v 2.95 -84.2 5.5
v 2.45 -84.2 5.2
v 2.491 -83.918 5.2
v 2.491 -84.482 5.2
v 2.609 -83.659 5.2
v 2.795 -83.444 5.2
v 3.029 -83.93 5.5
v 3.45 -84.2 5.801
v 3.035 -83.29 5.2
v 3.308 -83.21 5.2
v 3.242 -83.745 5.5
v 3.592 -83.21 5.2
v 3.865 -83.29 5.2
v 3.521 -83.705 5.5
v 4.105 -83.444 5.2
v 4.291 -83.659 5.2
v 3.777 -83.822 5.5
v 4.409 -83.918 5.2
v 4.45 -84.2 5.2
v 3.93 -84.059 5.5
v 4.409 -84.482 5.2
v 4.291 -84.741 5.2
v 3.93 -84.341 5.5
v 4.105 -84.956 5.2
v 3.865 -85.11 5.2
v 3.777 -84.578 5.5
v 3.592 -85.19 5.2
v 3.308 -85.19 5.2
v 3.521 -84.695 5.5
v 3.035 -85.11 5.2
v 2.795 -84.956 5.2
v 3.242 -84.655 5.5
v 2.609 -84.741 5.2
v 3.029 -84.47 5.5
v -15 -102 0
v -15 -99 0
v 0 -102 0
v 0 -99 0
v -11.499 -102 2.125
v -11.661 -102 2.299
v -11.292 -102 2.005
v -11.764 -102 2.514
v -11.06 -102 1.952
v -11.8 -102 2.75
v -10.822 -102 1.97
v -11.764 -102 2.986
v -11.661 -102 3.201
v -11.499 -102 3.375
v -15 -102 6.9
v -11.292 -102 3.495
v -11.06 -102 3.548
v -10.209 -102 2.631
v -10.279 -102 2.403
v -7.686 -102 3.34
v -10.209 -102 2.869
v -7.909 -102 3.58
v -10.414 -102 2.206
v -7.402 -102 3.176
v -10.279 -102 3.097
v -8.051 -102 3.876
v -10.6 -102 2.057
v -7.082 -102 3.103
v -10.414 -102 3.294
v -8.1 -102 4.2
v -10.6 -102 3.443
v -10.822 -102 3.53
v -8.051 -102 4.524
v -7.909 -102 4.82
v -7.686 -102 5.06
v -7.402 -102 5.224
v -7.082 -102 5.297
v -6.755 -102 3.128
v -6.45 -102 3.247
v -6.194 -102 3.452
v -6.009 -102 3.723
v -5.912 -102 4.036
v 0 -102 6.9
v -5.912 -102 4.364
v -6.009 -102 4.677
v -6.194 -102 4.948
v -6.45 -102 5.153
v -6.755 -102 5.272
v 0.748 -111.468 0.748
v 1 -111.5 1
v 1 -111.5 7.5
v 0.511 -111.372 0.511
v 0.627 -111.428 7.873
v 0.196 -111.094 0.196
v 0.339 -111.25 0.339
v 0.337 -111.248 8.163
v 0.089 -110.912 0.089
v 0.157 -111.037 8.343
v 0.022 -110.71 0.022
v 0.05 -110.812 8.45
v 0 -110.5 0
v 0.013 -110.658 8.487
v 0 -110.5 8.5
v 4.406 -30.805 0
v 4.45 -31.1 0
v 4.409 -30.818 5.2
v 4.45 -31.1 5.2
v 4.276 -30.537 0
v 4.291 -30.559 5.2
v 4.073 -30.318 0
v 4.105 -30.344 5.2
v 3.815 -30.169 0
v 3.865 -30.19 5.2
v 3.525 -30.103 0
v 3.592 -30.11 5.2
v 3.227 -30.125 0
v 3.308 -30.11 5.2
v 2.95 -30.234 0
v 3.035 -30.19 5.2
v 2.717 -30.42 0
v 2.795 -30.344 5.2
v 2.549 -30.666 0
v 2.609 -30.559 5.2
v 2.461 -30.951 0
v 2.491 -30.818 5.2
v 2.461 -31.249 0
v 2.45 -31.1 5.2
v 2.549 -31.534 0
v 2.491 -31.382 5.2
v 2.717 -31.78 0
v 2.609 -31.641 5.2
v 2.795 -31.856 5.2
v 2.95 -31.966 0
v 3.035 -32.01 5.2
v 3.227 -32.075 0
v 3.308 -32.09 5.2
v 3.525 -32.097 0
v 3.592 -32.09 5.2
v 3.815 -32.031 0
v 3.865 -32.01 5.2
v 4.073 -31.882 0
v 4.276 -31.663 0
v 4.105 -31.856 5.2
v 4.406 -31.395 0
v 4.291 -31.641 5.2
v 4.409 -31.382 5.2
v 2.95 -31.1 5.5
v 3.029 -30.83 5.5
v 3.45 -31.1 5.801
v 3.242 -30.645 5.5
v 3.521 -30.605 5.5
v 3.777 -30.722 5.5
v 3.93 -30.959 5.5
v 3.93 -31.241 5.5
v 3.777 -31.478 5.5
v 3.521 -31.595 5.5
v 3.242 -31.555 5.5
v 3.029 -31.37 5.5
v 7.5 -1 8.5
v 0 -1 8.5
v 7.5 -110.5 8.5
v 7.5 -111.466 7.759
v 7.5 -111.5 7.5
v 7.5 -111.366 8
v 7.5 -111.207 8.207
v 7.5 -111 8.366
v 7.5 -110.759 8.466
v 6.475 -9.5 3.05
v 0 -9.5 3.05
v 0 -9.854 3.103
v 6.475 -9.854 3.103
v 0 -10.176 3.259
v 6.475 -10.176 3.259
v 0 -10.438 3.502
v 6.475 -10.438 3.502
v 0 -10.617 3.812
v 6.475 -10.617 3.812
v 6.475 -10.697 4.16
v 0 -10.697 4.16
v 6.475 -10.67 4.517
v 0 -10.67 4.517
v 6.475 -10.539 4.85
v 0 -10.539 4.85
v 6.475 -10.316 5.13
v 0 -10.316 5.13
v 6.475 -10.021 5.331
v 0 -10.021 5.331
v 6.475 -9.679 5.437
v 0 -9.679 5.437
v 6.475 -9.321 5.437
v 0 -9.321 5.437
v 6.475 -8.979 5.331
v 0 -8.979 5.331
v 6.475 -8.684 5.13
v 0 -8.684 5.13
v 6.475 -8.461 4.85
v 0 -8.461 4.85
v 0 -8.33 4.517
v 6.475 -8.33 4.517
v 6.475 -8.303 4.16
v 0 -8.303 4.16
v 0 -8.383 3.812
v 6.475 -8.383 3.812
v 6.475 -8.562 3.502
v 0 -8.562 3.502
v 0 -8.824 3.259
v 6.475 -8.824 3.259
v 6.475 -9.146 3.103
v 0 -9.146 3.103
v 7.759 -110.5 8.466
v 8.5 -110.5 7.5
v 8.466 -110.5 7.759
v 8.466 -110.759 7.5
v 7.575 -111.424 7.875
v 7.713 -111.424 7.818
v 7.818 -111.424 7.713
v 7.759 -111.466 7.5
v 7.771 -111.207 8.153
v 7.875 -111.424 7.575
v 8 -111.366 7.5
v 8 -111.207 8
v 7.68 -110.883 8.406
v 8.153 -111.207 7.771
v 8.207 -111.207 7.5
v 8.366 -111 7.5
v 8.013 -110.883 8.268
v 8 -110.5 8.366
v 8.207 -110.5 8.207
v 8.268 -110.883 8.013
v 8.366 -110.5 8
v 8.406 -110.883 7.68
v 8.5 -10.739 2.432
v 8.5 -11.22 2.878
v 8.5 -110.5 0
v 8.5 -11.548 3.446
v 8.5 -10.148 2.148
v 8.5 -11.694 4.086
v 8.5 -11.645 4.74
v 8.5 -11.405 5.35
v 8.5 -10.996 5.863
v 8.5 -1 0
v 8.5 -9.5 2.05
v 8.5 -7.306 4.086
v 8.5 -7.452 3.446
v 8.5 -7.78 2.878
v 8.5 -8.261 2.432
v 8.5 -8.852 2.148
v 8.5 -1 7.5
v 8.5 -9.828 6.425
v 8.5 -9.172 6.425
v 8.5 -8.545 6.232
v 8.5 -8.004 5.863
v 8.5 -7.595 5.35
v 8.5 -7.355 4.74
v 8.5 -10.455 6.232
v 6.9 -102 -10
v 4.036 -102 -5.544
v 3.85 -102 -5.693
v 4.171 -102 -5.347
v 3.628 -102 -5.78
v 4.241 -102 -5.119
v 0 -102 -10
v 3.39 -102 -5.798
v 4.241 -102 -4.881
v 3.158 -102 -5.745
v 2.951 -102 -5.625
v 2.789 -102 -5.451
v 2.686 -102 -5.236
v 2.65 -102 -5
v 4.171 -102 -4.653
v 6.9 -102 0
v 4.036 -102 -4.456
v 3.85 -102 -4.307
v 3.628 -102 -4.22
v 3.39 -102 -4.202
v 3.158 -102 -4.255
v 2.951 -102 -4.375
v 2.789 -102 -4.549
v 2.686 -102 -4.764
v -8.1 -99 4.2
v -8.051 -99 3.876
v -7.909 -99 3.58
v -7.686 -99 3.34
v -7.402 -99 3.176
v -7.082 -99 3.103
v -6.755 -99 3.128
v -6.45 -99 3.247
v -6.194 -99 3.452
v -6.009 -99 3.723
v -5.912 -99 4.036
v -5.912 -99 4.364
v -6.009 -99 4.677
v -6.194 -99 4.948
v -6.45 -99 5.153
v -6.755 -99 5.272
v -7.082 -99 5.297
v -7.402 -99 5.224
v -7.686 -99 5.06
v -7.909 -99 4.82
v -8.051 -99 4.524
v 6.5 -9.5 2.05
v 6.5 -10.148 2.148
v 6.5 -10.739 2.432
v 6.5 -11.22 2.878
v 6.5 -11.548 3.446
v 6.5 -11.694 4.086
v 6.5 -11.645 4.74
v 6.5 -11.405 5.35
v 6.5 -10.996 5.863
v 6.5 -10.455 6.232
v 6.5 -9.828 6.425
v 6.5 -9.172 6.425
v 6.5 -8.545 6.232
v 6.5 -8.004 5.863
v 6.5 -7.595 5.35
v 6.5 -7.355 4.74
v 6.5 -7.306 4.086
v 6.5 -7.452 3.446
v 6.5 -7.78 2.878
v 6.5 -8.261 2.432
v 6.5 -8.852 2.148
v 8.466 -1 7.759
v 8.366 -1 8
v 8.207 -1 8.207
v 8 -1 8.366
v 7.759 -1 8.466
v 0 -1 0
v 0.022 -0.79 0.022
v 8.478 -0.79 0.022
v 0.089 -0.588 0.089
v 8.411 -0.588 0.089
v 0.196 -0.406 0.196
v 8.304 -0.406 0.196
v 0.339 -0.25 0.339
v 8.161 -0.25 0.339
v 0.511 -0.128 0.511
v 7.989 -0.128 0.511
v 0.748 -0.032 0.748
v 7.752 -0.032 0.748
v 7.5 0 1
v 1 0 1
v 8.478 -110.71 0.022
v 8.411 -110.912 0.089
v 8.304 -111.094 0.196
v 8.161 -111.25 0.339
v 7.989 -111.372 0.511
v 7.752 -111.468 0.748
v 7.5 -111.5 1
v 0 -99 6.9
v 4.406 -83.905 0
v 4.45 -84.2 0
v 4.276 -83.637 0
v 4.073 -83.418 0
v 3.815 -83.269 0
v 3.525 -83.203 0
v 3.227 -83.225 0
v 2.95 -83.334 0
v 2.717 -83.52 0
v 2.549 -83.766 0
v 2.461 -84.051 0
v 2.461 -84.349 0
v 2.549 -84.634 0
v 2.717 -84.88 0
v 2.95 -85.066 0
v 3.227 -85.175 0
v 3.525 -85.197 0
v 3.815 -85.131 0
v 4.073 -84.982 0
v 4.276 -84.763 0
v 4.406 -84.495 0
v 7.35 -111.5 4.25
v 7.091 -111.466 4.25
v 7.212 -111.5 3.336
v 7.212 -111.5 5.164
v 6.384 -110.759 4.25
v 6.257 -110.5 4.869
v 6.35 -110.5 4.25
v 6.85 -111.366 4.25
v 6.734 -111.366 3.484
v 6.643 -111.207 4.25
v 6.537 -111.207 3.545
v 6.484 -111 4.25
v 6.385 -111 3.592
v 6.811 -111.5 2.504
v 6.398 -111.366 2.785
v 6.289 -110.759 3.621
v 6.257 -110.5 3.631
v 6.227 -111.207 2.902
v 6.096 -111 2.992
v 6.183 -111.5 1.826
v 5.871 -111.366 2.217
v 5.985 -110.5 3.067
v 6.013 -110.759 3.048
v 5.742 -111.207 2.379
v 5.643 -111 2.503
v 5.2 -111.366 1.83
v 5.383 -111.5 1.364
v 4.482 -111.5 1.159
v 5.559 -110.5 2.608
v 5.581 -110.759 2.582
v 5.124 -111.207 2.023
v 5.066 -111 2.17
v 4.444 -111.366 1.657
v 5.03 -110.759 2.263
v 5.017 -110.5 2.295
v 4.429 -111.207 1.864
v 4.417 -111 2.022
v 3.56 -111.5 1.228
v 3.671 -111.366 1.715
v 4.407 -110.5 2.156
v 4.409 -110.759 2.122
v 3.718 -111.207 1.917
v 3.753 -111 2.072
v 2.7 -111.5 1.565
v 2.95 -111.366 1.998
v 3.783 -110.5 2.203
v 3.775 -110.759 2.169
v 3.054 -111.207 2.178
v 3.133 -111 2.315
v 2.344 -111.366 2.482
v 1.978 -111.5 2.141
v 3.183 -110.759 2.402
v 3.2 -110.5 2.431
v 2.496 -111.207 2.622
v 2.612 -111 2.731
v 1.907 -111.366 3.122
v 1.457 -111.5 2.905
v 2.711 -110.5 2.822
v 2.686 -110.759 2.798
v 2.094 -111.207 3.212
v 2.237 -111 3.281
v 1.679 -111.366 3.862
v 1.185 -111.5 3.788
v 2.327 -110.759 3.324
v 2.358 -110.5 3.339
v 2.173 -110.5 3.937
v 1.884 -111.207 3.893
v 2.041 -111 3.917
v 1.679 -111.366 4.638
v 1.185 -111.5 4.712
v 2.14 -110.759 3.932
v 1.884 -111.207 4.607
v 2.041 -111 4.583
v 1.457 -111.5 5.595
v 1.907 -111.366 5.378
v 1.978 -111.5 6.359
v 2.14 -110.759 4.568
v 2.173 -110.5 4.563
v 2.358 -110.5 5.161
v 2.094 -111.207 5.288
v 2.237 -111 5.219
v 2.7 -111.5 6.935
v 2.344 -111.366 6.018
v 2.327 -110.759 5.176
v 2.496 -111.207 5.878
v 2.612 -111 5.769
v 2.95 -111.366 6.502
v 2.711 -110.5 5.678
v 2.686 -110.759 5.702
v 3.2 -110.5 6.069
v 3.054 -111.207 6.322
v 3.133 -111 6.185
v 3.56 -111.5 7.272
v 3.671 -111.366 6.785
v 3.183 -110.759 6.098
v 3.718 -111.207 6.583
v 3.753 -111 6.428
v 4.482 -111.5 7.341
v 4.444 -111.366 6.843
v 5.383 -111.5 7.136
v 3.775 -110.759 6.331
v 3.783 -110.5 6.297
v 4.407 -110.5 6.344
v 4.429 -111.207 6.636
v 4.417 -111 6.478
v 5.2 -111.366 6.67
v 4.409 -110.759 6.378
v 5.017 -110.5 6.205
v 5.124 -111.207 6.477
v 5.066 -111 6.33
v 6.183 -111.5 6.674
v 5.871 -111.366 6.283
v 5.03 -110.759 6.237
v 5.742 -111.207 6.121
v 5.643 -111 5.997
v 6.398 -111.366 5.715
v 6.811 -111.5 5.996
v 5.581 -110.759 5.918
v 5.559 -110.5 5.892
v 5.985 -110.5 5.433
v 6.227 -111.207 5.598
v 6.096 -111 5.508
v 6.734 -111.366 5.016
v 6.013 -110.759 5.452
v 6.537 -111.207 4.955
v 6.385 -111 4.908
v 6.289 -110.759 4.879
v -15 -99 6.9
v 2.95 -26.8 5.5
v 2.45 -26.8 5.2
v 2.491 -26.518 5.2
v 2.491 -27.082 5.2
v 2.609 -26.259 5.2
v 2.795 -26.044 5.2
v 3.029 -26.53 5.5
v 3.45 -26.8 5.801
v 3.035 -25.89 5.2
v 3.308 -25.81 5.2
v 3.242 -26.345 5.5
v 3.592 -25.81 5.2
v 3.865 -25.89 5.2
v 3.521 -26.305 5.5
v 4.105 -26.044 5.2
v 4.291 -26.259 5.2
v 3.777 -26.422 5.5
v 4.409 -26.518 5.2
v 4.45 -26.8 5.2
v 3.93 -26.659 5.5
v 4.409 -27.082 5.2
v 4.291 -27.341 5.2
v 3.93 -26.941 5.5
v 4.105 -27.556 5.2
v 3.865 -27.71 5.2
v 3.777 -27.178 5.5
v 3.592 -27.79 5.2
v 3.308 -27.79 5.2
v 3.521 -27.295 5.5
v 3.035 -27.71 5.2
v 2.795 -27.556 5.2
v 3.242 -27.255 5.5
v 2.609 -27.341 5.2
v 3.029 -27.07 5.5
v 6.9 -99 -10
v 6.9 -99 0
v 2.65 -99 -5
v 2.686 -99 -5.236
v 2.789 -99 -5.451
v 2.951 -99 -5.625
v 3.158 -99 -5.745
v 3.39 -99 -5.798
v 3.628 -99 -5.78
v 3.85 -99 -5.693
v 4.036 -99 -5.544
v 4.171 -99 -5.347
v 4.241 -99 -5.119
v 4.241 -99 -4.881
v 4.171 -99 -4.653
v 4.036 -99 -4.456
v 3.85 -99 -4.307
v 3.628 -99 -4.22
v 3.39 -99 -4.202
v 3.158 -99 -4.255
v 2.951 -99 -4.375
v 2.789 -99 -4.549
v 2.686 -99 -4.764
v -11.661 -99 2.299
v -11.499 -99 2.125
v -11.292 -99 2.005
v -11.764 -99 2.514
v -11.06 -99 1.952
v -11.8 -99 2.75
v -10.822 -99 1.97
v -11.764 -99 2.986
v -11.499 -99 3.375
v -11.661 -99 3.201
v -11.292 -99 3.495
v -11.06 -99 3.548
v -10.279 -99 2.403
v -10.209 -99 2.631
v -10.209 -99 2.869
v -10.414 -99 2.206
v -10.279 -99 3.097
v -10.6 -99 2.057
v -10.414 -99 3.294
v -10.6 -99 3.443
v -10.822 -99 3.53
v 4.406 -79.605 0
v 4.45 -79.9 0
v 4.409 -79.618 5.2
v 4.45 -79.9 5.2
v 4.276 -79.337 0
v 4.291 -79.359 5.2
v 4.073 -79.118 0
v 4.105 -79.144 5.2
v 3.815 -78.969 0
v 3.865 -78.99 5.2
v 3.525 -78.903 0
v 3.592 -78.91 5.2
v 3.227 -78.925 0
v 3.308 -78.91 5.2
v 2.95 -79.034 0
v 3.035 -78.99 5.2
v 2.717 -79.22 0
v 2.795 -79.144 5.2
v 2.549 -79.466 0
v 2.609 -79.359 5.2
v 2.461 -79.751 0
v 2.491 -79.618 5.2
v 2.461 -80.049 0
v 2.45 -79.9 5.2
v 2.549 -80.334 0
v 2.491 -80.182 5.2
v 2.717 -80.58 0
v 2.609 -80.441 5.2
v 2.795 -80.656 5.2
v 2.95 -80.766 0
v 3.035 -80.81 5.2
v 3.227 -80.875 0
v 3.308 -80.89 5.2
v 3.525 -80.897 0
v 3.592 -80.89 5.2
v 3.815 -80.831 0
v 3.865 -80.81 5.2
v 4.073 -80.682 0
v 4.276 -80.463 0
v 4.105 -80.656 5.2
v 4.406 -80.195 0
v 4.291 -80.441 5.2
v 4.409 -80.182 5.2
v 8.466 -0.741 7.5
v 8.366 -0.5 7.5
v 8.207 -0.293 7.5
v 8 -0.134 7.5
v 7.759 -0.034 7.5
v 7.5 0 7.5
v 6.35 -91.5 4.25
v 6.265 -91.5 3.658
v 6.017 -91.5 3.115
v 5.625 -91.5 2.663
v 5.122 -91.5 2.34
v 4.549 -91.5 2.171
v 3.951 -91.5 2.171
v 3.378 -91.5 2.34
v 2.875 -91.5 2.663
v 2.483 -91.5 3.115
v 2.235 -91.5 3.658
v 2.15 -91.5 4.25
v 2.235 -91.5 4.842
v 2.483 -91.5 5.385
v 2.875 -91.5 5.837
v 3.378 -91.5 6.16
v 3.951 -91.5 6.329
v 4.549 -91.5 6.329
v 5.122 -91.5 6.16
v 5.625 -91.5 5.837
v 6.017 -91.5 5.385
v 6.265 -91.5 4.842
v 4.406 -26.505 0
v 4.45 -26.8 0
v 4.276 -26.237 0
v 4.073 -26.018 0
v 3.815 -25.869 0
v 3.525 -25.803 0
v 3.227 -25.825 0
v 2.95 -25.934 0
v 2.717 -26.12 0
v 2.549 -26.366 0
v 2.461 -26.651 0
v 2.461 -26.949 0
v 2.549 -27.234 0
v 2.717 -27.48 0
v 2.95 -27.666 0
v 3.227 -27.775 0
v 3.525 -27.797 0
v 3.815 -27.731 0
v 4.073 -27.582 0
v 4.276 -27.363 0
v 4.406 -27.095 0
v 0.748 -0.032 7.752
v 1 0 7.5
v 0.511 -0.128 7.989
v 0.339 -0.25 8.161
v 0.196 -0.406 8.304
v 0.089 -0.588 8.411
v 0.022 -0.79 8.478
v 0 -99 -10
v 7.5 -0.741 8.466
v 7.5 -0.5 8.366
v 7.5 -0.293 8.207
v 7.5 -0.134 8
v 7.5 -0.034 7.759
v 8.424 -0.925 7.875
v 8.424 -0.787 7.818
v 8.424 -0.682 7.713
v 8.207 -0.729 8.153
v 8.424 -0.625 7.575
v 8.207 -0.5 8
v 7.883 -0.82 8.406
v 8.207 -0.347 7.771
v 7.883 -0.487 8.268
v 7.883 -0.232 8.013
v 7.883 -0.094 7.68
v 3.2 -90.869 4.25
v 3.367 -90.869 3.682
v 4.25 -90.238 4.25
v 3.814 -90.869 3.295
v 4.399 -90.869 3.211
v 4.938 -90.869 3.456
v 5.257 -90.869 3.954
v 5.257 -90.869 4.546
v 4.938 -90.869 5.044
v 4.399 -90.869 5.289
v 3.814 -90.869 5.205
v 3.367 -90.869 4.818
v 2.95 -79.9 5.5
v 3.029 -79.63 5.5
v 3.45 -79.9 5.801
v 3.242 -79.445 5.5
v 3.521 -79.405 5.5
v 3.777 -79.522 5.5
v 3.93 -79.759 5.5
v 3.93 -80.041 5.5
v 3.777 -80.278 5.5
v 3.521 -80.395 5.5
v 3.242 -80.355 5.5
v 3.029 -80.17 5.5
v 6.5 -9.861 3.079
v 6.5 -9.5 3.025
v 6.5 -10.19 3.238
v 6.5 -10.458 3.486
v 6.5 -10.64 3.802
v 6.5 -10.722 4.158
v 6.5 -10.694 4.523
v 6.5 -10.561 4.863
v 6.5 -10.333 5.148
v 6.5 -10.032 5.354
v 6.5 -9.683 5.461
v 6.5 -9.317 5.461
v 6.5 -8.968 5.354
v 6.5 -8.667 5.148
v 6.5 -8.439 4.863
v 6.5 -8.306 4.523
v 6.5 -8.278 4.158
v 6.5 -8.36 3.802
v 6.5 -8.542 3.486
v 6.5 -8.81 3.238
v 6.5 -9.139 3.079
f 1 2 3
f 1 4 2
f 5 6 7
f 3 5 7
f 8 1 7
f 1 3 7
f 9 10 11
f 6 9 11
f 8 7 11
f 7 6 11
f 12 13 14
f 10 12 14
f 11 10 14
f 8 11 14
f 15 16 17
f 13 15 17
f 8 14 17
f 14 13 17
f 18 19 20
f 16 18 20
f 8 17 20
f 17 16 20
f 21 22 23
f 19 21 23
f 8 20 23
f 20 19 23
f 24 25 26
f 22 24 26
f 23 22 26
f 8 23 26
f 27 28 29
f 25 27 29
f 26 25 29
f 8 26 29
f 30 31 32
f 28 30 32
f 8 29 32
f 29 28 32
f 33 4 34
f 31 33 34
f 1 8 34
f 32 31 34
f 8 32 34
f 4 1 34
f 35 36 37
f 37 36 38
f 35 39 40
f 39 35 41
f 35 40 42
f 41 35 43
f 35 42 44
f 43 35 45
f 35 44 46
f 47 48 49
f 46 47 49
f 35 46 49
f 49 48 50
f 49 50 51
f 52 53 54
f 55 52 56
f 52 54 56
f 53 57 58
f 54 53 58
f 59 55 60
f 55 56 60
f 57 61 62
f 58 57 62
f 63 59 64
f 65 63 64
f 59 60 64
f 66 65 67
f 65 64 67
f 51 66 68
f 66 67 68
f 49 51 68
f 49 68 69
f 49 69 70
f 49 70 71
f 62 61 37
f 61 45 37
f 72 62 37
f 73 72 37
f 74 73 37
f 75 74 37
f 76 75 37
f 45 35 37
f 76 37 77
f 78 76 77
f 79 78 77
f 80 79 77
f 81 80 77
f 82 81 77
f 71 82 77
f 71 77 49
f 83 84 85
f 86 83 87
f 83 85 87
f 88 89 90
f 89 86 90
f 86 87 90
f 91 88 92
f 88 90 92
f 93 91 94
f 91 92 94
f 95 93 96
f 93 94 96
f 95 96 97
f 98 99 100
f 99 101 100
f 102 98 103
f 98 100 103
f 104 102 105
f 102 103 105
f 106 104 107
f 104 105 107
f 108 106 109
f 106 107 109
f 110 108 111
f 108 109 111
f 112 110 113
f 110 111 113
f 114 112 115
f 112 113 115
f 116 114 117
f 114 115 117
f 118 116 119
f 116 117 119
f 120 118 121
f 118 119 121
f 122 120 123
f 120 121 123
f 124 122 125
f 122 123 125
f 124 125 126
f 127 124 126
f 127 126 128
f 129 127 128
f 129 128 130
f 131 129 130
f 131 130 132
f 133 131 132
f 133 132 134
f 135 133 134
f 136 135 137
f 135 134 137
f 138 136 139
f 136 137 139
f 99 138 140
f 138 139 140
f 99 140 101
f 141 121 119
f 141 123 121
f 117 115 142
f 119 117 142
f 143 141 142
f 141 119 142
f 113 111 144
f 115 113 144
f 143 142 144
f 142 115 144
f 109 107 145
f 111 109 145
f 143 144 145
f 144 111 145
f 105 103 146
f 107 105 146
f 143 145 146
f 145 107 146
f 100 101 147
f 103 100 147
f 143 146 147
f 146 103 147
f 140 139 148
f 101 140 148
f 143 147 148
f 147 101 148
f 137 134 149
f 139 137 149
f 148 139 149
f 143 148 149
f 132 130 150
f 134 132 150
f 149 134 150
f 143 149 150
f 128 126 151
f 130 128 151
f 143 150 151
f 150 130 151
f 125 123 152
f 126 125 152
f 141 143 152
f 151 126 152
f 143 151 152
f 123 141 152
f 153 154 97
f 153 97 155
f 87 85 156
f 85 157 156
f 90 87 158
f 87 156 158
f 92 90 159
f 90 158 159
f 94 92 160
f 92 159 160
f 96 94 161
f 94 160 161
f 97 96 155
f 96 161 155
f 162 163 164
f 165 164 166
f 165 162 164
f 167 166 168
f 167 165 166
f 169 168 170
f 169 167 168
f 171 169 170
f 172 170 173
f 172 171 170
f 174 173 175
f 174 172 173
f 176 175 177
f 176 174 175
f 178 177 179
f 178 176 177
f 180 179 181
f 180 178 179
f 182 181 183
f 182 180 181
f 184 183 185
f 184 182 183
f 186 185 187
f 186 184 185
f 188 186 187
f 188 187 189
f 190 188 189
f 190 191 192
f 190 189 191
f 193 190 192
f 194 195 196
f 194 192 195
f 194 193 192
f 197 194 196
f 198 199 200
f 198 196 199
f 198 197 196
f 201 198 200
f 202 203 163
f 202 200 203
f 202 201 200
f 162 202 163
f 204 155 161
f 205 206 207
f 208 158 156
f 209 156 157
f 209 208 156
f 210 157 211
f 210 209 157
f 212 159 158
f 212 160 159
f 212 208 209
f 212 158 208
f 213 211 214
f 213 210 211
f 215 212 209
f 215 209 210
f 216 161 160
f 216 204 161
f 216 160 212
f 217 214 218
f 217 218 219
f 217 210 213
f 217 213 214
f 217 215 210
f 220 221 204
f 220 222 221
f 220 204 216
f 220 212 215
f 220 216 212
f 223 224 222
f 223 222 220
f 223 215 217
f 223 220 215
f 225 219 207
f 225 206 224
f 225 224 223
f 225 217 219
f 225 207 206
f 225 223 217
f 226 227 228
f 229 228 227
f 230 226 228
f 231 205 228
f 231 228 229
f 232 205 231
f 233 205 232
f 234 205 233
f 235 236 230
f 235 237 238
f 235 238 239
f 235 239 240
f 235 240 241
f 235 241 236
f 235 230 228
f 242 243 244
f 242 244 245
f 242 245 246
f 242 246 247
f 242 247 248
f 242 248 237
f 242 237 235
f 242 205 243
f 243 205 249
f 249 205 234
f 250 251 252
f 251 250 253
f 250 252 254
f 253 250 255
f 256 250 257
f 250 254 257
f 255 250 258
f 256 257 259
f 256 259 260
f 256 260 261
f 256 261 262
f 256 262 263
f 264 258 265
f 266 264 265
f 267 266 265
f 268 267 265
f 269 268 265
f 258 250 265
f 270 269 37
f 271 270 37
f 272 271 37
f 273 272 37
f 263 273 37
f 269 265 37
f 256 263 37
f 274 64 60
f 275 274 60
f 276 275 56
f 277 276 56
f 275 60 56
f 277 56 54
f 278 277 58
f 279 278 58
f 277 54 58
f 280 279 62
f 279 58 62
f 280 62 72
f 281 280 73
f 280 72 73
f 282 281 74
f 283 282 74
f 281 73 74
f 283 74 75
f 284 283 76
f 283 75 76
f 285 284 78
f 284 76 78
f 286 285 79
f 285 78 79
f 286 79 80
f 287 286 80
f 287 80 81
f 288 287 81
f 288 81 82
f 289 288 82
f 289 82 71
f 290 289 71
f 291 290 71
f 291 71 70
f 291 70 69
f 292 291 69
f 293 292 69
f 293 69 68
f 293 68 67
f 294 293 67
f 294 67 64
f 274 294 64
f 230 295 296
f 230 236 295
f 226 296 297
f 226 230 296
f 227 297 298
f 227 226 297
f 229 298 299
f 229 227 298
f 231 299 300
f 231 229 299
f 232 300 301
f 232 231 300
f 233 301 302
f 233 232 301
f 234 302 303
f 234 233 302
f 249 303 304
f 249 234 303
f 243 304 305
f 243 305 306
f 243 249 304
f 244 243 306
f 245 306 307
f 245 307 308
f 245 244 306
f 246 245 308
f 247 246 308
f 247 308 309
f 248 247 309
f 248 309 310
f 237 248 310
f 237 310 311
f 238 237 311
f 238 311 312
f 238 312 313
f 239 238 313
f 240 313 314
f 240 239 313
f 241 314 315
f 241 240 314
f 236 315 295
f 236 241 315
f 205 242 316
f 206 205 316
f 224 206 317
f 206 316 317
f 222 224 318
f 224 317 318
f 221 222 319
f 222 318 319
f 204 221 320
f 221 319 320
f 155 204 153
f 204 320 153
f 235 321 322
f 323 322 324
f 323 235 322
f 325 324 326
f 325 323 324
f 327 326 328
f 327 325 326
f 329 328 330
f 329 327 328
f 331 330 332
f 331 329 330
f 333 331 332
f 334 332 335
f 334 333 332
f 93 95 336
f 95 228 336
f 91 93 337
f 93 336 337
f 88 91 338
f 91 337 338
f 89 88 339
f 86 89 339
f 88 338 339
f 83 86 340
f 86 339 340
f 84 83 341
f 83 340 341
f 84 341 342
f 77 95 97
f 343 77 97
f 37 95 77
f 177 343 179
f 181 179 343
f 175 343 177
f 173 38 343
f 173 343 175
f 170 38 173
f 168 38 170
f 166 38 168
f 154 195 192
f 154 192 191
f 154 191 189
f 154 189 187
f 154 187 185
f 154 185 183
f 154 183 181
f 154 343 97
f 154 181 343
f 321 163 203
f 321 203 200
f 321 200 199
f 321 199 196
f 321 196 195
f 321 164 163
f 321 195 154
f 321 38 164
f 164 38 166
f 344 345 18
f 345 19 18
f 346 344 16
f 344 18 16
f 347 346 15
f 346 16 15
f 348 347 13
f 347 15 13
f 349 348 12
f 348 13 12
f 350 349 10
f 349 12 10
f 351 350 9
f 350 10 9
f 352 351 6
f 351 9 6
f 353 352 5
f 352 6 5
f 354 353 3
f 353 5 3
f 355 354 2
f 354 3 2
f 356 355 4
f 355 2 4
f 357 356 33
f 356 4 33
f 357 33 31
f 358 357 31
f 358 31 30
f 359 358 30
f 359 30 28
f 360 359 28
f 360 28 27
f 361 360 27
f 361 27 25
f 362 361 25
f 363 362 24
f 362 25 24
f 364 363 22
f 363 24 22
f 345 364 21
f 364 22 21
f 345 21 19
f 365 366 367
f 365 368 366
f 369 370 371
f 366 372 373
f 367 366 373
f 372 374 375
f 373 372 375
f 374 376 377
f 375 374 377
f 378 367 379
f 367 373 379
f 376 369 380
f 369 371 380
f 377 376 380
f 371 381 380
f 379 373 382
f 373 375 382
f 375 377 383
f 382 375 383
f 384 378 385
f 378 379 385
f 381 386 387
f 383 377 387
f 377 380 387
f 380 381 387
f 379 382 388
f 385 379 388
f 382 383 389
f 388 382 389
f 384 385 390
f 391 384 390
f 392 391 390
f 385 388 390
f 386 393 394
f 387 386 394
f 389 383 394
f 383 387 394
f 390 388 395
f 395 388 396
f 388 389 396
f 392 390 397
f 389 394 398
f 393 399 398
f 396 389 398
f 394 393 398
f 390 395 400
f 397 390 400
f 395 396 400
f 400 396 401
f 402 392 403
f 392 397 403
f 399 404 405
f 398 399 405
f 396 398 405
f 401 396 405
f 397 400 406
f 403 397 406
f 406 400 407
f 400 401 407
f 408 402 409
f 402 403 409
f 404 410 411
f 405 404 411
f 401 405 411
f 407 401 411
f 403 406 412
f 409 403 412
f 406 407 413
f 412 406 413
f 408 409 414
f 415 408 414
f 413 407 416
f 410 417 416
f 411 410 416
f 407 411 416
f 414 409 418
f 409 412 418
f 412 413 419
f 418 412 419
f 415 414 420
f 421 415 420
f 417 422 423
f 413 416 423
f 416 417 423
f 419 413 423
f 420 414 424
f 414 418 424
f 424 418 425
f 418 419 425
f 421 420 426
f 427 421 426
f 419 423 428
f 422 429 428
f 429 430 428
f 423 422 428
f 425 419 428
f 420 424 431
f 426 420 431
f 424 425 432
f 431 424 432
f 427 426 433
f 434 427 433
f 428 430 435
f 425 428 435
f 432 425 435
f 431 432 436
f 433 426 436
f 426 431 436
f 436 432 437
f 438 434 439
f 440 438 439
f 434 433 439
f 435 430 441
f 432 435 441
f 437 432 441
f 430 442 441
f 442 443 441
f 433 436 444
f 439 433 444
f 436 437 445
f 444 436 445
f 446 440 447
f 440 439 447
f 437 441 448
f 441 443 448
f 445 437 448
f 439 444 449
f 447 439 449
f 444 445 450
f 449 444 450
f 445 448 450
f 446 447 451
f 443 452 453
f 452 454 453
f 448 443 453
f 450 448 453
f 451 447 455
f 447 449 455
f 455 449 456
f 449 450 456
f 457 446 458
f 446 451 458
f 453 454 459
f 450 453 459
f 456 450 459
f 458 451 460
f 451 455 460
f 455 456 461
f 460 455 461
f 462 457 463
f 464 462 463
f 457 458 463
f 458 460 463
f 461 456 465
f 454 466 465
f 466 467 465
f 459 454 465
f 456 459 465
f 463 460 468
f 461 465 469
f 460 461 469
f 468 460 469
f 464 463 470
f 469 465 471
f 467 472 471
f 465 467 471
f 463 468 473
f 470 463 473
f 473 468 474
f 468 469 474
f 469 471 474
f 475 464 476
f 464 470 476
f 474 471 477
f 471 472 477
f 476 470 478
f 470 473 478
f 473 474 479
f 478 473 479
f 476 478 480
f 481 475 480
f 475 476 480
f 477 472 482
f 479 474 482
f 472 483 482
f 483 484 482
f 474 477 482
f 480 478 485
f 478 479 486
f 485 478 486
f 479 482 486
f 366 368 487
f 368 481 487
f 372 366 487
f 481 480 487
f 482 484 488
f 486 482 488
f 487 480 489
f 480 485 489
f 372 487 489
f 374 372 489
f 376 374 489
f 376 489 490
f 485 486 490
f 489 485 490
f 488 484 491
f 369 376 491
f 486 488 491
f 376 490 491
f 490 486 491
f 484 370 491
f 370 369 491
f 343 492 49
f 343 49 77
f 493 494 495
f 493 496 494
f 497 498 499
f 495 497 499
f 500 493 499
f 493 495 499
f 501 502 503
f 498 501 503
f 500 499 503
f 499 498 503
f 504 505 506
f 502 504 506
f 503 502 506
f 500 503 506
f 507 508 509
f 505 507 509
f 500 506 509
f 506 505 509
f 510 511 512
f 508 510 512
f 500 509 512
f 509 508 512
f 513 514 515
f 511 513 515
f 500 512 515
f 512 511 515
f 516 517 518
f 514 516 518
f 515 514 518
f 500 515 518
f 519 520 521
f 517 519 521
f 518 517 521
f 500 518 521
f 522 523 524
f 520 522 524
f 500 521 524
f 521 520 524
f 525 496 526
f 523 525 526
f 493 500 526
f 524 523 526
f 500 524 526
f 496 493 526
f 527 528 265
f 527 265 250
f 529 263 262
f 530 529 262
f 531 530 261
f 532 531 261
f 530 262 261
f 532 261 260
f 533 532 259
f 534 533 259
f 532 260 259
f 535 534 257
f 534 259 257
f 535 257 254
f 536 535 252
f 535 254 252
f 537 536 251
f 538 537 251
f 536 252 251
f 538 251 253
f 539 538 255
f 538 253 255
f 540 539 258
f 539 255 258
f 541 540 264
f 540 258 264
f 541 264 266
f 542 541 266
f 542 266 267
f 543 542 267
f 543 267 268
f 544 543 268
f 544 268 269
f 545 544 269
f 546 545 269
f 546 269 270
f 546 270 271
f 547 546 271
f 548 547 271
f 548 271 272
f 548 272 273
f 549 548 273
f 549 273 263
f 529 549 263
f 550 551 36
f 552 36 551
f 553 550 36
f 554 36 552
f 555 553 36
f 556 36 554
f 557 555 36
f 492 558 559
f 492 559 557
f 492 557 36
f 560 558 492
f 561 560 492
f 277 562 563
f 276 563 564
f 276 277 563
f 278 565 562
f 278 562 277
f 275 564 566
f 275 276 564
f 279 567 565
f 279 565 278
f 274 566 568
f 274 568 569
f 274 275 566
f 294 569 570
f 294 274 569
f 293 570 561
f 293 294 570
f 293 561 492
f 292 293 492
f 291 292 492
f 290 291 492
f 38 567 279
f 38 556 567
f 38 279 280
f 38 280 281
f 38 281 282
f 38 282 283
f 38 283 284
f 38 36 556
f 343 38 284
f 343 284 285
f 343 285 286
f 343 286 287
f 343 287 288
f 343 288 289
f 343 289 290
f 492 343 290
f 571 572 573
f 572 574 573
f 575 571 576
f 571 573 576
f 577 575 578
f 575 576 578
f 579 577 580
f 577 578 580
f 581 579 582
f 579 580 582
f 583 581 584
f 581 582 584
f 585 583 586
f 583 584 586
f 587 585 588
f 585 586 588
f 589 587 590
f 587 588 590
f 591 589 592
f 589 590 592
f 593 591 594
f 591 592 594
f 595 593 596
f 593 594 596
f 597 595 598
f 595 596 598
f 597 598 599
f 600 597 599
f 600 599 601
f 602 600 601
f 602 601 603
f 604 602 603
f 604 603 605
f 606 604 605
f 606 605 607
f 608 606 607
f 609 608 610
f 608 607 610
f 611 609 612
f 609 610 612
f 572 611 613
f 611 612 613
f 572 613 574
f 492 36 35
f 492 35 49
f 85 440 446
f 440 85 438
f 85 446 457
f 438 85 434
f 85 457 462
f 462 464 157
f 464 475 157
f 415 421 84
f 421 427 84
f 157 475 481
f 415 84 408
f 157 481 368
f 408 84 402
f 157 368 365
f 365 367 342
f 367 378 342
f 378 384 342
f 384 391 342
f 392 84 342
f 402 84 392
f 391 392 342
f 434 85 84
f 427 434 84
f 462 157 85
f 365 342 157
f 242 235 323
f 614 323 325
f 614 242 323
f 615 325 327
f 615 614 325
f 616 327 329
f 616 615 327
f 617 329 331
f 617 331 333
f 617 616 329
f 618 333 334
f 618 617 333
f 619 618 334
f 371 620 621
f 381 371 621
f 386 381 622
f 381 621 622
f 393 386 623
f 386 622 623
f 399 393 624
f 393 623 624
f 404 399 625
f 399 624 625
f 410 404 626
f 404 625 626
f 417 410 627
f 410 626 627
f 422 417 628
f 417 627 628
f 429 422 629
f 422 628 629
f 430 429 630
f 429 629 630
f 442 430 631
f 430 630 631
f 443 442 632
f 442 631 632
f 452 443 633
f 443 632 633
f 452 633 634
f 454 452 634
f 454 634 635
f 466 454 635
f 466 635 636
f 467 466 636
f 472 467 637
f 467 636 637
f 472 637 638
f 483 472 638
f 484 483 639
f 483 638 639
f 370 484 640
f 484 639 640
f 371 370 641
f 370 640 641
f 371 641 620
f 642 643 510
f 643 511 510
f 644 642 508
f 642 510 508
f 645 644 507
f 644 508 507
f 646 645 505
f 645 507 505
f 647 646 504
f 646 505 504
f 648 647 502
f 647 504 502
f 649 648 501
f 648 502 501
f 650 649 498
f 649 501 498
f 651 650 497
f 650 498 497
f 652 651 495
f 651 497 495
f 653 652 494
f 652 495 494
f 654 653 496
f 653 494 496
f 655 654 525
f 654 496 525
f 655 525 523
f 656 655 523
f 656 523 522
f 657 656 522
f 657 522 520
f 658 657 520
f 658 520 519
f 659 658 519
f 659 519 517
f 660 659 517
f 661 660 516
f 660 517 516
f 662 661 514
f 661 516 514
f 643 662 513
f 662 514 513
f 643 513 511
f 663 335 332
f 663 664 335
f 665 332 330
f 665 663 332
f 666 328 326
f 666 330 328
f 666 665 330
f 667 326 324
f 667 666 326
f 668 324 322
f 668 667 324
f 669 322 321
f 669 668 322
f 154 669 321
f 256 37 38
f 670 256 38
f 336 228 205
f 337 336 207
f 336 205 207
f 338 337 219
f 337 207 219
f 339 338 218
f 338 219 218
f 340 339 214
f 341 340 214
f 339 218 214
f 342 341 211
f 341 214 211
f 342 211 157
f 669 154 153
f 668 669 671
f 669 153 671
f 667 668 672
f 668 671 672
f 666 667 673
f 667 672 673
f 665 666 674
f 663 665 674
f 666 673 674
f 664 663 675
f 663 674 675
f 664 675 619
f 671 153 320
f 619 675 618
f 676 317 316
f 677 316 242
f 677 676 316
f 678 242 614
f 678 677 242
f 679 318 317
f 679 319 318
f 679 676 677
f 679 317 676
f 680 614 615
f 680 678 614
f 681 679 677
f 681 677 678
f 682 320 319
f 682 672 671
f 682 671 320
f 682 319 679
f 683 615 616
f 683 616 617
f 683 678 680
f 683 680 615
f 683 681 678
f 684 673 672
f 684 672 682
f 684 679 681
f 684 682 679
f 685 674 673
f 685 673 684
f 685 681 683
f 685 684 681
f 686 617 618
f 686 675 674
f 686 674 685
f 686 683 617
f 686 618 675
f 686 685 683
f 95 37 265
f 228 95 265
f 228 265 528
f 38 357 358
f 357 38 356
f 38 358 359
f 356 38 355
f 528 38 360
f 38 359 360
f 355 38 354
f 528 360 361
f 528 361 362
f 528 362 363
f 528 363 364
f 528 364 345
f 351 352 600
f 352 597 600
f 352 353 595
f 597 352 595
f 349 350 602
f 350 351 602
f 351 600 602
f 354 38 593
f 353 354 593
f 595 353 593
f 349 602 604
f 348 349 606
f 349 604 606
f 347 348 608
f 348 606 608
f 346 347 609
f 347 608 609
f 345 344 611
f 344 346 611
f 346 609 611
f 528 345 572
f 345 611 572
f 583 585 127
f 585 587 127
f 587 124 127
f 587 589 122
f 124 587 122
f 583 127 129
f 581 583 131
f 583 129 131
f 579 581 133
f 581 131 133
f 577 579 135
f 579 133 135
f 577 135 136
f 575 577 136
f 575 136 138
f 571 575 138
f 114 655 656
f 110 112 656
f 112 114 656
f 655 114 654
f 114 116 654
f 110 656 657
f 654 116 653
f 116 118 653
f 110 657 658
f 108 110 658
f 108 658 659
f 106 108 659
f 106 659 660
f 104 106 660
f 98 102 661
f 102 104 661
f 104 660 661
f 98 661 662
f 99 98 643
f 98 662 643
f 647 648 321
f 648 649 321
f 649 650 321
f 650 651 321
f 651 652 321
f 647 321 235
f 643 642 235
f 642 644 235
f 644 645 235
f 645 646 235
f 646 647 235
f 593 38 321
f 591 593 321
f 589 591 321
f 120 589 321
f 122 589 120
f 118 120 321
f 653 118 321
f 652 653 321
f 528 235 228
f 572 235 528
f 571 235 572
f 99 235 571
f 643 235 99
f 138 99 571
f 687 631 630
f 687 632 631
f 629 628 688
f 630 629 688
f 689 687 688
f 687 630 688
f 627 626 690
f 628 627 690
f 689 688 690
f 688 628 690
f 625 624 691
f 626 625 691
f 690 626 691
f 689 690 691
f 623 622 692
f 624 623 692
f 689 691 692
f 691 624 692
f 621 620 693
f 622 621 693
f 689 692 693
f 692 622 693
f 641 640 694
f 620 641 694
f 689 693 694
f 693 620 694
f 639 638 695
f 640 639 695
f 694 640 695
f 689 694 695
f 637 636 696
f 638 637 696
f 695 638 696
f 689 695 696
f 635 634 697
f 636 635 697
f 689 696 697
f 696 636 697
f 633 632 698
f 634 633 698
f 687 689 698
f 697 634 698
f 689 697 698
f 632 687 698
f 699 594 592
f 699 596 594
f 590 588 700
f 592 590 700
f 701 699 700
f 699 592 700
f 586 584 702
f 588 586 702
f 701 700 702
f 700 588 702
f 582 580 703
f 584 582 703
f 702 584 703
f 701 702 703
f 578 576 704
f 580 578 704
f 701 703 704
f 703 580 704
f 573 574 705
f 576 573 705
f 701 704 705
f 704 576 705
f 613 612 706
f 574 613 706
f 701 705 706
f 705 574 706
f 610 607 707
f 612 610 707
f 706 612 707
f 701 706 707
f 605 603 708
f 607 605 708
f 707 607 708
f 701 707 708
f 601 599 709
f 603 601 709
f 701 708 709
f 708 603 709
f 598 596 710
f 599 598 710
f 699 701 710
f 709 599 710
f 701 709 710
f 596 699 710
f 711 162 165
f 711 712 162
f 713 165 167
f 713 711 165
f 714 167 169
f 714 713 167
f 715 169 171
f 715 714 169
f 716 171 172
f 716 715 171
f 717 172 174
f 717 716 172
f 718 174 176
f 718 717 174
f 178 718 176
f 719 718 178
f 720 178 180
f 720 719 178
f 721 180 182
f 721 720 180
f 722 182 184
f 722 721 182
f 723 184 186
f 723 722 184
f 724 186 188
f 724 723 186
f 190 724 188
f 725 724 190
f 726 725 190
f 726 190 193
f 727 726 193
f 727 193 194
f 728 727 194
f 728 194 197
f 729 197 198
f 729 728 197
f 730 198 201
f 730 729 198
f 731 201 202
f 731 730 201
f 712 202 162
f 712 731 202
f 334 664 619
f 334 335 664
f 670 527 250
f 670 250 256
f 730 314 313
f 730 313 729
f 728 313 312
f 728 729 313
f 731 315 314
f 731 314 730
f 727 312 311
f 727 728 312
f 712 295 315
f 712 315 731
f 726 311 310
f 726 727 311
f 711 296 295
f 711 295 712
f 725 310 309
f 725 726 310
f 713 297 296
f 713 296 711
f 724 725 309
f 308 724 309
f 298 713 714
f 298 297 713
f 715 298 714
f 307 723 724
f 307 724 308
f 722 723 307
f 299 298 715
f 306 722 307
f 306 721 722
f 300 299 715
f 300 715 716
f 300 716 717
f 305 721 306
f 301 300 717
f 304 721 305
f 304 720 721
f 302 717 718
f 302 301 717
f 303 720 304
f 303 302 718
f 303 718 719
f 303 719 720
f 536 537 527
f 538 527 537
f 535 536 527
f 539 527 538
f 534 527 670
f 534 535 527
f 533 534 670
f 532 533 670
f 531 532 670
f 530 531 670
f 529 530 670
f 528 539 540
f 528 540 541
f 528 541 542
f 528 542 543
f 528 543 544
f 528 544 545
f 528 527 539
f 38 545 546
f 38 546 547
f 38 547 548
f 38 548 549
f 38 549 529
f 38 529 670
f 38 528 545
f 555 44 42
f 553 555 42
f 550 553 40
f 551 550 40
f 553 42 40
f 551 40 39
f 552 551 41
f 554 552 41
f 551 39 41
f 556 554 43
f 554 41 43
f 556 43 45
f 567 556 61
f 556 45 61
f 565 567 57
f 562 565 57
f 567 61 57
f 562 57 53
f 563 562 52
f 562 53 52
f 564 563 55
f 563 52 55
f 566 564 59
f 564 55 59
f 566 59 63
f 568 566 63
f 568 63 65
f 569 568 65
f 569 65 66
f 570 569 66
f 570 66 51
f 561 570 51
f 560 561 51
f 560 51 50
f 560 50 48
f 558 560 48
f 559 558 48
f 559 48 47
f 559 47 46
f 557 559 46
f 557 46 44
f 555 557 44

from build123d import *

# Parameters (mm, degrees)
SKETCH1_W                      = 8.5
SKETCH1_H                      = 111.5
BOSS_EXTRUDE5_DEPTH            = 8.5
M5X0_8_TAPPED_HOLE2_D          = 4.2
M5X0_8_TAPPED_HOLE2_DEPTH      = 20
M5X0_8_TAPPED_HOLE2_TIP        = 1.2618073
SKETCH35_W                     = 8.5
SKETCH35_H                     = 3
BOSS_EXTRUDE6_DEPTH            = 15
F_2_2_2_2_DIAMETER_HOLE1_D     = 2.2
F_2_2_2_2_DIAMETER_HOLE1_DEPTH = 13
M2X0_4_TAPPED_HOLE5_D          = 1.6
M2X0_4_TAPPED_HOLE5_DEPTH      = 3
SKETCH40_W                     = 8.5
SKETCH40_H                     = 3
BOSS_EXTRUDE7_DEPTH            = 10
M2X0_4_TAPPED_HOLE4_D          = 1.6
M2X0_4_TAPPED_HOLE4_DEPTH      = 3
FILLET1_R                      = 1
M2X0_4_TAPPED_HOLE3_D          = 2
M2X0_4_TAPPED_HOLE3_DEPTH      = 5.2
M2X0_4_TAPPED_HOLE3_TIP        = 0.600860619
SKETCH49_W                     = 1.6
SKETCH49_H                     = 10
SKETCH49_W_2                   = 15
SKETCH49_H_2                   = 1.6
CUT_EXTRUDE1_DEPTH             = 10


with BuildPart() as part:
    # Sketch1 → Boss-Extrude5 (new body)
    with BuildSketch(Plane.XY):
        with Locations((4.25, -55.75)):
            Rectangle(SKETCH1_W, SKETCH1_H)
    extrude(amount=BOSS_EXTRUDE5_DEPTH)

    # M5x0.8 Tapped Hole2
    with Locations(Plane(origin=(0, -111.5, 0), x_dir=(-1, 0, 0), z_dir=(0, -1, 0))):
        with Locations((-4.25, -4.25)):
            Hole(M5X0_8_TAPPED_HOLE2_D / 2, depth=M5X0_8_TAPPED_HOLE2_DEPTH)
            with Locations((0, 0, -(M5X0_8_TAPPED_HOLE2_DEPTH + M5X0_8_TAPPED_HOLE2_TIP / 2))):  # 118° drill point
                Cone(0, M5X0_8_TAPPED_HOLE2_D / 2, M5X0_8_TAPPED_HOLE2_TIP, mode=Mode.SUBTRACT)

    # Sketch35 → Boss-Extrude6 (add)
    with BuildSketch(Plane.ZY):
        with Locations((4.25, -100.5)):
            Rectangle(SKETCH35_W, SKETCH35_H)
    extrude(amount=BOSS_EXTRUDE6_DEPTH)

    # Ø2.2 (2.2) Diameter Hole1
    with Locations(Plane(origin=(0, -99, 0), x_dir=(1, 0, 0), z_dir=(0, 1, 0))):
        with Locations((-7, -4.2)):
            Hole(F_2_2_2_2_DIAMETER_HOLE1_D / 2, depth=F_2_2_2_2_DIAMETER_HOLE1_DEPTH)

    # M2x0.4 Tapped Hole5
    with Locations(Plane(origin=(0, -99, 0), x_dir=(1, 0, 0), z_dir=(0, 1, 0))):
        with Locations((-11, -2.75)):
            Hole(M2X0_4_TAPPED_HOLE5_D / 2, depth=M2X0_4_TAPPED_HOLE5_DEPTH)

    # Sketch40 → Boss-Extrude7 (add)
    with BuildSketch(Plane(origin=(0, 0, 0), x_dir=(-1, 0, 0), z_dir=(0, 0, -1))):
        with Locations((-4.25, -100.5)):
            Rectangle(SKETCH40_W, SKETCH40_H)
    extrude(amount=BOSS_EXTRUDE7_DEPTH)

    # M2x0.4 Tapped Hole4
    with Locations(Plane(origin=(0, -99, 0), x_dir=(1, 0, 0), z_dir=(0, 1, 0))):
        with Locations((3.45, 5)):
            Hole(M2X0_4_TAPPED_HOLE4_D / 2, depth=M2X0_4_TAPPED_HOLE4_DEPTH)

    # Sketch45 → CBORE for M2 Socket Head Cap Screw1 (revolve, cut)
    with BuildSketch(Plane(origin=(8.5, -9.5, 4.25), x_dir=(0, 0, -1), z_dir=(0, 1, 0))):
        Polygon((0, 0), (0, 23.500025), (1.2, 23.500025), (1.2, 2.025), (1.225, 2), (2.2, 2), (2.2, 0), align=None)
    revolve(axis=Axis((14.85, -9.5, 4.25), (-1, 0, 0)), mode=Mode.SUBTRACT)

    # Fillet1
    fillet1_edges = [part.edges().sort_by_distance(p)[0] for p in [
        (4.25, 0, 8.5),
        (2.15, -111.5, 4.25),
        (8.5, -55.75, 8.5),
        (4.25, 0, 0),
        (4.25, -111.5, 0),
        (4.25, -111.5, 8.5),
        (8.5, 0, 4.25),
        (0, 0, 4.25),
        (0, -111.5, 4.25),
        (8.5, -111.5, 4.25),
    ]]
    fillet(fillet1_edges, radius=FILLET1_R)

    # M2x0.4 Tapped Hole3
    with Locations(Plane(origin=(0, 0, 0), x_dir=(-1, 0, 0), z_dir=(0, 0, -1))):
        with Locations((-3.45, -26.8), (-3.45, -84.2), (-3.45, -31.1), (-3.45, -79.9)):
            Hole(M2X0_4_TAPPED_HOLE3_D / 2, depth=M2X0_4_TAPPED_HOLE3_DEPTH)
            with Locations((0, 0, -(M2X0_4_TAPPED_HOLE3_DEPTH + M2X0_4_TAPPED_HOLE3_TIP / 2))):  # 118° drill point
                Cone(0, M2X0_4_TAPPED_HOLE3_D / 2, M2X0_4_TAPPED_HOLE3_TIP, mode=Mode.SUBTRACT)

    # Sketch49 → Cut-Extrude1 (cut)
    with BuildSketch(Plane(origin=(0, -99, 0), x_dir=(1, 0, 0), z_dir=(0, 1, 0))):
        with Locations((7.7, 5)):
            Rectangle(SKETCH49_W, SKETCH49_H)
        with Locations((-7.5, -7.7)):
            Rectangle(SKETCH49_W_2, SKETCH49_H_2)
    extrude(amount=-CUT_EXTRUDE1_DEPTH, mode=Mode.SUBTRACT)


solid = part.part
